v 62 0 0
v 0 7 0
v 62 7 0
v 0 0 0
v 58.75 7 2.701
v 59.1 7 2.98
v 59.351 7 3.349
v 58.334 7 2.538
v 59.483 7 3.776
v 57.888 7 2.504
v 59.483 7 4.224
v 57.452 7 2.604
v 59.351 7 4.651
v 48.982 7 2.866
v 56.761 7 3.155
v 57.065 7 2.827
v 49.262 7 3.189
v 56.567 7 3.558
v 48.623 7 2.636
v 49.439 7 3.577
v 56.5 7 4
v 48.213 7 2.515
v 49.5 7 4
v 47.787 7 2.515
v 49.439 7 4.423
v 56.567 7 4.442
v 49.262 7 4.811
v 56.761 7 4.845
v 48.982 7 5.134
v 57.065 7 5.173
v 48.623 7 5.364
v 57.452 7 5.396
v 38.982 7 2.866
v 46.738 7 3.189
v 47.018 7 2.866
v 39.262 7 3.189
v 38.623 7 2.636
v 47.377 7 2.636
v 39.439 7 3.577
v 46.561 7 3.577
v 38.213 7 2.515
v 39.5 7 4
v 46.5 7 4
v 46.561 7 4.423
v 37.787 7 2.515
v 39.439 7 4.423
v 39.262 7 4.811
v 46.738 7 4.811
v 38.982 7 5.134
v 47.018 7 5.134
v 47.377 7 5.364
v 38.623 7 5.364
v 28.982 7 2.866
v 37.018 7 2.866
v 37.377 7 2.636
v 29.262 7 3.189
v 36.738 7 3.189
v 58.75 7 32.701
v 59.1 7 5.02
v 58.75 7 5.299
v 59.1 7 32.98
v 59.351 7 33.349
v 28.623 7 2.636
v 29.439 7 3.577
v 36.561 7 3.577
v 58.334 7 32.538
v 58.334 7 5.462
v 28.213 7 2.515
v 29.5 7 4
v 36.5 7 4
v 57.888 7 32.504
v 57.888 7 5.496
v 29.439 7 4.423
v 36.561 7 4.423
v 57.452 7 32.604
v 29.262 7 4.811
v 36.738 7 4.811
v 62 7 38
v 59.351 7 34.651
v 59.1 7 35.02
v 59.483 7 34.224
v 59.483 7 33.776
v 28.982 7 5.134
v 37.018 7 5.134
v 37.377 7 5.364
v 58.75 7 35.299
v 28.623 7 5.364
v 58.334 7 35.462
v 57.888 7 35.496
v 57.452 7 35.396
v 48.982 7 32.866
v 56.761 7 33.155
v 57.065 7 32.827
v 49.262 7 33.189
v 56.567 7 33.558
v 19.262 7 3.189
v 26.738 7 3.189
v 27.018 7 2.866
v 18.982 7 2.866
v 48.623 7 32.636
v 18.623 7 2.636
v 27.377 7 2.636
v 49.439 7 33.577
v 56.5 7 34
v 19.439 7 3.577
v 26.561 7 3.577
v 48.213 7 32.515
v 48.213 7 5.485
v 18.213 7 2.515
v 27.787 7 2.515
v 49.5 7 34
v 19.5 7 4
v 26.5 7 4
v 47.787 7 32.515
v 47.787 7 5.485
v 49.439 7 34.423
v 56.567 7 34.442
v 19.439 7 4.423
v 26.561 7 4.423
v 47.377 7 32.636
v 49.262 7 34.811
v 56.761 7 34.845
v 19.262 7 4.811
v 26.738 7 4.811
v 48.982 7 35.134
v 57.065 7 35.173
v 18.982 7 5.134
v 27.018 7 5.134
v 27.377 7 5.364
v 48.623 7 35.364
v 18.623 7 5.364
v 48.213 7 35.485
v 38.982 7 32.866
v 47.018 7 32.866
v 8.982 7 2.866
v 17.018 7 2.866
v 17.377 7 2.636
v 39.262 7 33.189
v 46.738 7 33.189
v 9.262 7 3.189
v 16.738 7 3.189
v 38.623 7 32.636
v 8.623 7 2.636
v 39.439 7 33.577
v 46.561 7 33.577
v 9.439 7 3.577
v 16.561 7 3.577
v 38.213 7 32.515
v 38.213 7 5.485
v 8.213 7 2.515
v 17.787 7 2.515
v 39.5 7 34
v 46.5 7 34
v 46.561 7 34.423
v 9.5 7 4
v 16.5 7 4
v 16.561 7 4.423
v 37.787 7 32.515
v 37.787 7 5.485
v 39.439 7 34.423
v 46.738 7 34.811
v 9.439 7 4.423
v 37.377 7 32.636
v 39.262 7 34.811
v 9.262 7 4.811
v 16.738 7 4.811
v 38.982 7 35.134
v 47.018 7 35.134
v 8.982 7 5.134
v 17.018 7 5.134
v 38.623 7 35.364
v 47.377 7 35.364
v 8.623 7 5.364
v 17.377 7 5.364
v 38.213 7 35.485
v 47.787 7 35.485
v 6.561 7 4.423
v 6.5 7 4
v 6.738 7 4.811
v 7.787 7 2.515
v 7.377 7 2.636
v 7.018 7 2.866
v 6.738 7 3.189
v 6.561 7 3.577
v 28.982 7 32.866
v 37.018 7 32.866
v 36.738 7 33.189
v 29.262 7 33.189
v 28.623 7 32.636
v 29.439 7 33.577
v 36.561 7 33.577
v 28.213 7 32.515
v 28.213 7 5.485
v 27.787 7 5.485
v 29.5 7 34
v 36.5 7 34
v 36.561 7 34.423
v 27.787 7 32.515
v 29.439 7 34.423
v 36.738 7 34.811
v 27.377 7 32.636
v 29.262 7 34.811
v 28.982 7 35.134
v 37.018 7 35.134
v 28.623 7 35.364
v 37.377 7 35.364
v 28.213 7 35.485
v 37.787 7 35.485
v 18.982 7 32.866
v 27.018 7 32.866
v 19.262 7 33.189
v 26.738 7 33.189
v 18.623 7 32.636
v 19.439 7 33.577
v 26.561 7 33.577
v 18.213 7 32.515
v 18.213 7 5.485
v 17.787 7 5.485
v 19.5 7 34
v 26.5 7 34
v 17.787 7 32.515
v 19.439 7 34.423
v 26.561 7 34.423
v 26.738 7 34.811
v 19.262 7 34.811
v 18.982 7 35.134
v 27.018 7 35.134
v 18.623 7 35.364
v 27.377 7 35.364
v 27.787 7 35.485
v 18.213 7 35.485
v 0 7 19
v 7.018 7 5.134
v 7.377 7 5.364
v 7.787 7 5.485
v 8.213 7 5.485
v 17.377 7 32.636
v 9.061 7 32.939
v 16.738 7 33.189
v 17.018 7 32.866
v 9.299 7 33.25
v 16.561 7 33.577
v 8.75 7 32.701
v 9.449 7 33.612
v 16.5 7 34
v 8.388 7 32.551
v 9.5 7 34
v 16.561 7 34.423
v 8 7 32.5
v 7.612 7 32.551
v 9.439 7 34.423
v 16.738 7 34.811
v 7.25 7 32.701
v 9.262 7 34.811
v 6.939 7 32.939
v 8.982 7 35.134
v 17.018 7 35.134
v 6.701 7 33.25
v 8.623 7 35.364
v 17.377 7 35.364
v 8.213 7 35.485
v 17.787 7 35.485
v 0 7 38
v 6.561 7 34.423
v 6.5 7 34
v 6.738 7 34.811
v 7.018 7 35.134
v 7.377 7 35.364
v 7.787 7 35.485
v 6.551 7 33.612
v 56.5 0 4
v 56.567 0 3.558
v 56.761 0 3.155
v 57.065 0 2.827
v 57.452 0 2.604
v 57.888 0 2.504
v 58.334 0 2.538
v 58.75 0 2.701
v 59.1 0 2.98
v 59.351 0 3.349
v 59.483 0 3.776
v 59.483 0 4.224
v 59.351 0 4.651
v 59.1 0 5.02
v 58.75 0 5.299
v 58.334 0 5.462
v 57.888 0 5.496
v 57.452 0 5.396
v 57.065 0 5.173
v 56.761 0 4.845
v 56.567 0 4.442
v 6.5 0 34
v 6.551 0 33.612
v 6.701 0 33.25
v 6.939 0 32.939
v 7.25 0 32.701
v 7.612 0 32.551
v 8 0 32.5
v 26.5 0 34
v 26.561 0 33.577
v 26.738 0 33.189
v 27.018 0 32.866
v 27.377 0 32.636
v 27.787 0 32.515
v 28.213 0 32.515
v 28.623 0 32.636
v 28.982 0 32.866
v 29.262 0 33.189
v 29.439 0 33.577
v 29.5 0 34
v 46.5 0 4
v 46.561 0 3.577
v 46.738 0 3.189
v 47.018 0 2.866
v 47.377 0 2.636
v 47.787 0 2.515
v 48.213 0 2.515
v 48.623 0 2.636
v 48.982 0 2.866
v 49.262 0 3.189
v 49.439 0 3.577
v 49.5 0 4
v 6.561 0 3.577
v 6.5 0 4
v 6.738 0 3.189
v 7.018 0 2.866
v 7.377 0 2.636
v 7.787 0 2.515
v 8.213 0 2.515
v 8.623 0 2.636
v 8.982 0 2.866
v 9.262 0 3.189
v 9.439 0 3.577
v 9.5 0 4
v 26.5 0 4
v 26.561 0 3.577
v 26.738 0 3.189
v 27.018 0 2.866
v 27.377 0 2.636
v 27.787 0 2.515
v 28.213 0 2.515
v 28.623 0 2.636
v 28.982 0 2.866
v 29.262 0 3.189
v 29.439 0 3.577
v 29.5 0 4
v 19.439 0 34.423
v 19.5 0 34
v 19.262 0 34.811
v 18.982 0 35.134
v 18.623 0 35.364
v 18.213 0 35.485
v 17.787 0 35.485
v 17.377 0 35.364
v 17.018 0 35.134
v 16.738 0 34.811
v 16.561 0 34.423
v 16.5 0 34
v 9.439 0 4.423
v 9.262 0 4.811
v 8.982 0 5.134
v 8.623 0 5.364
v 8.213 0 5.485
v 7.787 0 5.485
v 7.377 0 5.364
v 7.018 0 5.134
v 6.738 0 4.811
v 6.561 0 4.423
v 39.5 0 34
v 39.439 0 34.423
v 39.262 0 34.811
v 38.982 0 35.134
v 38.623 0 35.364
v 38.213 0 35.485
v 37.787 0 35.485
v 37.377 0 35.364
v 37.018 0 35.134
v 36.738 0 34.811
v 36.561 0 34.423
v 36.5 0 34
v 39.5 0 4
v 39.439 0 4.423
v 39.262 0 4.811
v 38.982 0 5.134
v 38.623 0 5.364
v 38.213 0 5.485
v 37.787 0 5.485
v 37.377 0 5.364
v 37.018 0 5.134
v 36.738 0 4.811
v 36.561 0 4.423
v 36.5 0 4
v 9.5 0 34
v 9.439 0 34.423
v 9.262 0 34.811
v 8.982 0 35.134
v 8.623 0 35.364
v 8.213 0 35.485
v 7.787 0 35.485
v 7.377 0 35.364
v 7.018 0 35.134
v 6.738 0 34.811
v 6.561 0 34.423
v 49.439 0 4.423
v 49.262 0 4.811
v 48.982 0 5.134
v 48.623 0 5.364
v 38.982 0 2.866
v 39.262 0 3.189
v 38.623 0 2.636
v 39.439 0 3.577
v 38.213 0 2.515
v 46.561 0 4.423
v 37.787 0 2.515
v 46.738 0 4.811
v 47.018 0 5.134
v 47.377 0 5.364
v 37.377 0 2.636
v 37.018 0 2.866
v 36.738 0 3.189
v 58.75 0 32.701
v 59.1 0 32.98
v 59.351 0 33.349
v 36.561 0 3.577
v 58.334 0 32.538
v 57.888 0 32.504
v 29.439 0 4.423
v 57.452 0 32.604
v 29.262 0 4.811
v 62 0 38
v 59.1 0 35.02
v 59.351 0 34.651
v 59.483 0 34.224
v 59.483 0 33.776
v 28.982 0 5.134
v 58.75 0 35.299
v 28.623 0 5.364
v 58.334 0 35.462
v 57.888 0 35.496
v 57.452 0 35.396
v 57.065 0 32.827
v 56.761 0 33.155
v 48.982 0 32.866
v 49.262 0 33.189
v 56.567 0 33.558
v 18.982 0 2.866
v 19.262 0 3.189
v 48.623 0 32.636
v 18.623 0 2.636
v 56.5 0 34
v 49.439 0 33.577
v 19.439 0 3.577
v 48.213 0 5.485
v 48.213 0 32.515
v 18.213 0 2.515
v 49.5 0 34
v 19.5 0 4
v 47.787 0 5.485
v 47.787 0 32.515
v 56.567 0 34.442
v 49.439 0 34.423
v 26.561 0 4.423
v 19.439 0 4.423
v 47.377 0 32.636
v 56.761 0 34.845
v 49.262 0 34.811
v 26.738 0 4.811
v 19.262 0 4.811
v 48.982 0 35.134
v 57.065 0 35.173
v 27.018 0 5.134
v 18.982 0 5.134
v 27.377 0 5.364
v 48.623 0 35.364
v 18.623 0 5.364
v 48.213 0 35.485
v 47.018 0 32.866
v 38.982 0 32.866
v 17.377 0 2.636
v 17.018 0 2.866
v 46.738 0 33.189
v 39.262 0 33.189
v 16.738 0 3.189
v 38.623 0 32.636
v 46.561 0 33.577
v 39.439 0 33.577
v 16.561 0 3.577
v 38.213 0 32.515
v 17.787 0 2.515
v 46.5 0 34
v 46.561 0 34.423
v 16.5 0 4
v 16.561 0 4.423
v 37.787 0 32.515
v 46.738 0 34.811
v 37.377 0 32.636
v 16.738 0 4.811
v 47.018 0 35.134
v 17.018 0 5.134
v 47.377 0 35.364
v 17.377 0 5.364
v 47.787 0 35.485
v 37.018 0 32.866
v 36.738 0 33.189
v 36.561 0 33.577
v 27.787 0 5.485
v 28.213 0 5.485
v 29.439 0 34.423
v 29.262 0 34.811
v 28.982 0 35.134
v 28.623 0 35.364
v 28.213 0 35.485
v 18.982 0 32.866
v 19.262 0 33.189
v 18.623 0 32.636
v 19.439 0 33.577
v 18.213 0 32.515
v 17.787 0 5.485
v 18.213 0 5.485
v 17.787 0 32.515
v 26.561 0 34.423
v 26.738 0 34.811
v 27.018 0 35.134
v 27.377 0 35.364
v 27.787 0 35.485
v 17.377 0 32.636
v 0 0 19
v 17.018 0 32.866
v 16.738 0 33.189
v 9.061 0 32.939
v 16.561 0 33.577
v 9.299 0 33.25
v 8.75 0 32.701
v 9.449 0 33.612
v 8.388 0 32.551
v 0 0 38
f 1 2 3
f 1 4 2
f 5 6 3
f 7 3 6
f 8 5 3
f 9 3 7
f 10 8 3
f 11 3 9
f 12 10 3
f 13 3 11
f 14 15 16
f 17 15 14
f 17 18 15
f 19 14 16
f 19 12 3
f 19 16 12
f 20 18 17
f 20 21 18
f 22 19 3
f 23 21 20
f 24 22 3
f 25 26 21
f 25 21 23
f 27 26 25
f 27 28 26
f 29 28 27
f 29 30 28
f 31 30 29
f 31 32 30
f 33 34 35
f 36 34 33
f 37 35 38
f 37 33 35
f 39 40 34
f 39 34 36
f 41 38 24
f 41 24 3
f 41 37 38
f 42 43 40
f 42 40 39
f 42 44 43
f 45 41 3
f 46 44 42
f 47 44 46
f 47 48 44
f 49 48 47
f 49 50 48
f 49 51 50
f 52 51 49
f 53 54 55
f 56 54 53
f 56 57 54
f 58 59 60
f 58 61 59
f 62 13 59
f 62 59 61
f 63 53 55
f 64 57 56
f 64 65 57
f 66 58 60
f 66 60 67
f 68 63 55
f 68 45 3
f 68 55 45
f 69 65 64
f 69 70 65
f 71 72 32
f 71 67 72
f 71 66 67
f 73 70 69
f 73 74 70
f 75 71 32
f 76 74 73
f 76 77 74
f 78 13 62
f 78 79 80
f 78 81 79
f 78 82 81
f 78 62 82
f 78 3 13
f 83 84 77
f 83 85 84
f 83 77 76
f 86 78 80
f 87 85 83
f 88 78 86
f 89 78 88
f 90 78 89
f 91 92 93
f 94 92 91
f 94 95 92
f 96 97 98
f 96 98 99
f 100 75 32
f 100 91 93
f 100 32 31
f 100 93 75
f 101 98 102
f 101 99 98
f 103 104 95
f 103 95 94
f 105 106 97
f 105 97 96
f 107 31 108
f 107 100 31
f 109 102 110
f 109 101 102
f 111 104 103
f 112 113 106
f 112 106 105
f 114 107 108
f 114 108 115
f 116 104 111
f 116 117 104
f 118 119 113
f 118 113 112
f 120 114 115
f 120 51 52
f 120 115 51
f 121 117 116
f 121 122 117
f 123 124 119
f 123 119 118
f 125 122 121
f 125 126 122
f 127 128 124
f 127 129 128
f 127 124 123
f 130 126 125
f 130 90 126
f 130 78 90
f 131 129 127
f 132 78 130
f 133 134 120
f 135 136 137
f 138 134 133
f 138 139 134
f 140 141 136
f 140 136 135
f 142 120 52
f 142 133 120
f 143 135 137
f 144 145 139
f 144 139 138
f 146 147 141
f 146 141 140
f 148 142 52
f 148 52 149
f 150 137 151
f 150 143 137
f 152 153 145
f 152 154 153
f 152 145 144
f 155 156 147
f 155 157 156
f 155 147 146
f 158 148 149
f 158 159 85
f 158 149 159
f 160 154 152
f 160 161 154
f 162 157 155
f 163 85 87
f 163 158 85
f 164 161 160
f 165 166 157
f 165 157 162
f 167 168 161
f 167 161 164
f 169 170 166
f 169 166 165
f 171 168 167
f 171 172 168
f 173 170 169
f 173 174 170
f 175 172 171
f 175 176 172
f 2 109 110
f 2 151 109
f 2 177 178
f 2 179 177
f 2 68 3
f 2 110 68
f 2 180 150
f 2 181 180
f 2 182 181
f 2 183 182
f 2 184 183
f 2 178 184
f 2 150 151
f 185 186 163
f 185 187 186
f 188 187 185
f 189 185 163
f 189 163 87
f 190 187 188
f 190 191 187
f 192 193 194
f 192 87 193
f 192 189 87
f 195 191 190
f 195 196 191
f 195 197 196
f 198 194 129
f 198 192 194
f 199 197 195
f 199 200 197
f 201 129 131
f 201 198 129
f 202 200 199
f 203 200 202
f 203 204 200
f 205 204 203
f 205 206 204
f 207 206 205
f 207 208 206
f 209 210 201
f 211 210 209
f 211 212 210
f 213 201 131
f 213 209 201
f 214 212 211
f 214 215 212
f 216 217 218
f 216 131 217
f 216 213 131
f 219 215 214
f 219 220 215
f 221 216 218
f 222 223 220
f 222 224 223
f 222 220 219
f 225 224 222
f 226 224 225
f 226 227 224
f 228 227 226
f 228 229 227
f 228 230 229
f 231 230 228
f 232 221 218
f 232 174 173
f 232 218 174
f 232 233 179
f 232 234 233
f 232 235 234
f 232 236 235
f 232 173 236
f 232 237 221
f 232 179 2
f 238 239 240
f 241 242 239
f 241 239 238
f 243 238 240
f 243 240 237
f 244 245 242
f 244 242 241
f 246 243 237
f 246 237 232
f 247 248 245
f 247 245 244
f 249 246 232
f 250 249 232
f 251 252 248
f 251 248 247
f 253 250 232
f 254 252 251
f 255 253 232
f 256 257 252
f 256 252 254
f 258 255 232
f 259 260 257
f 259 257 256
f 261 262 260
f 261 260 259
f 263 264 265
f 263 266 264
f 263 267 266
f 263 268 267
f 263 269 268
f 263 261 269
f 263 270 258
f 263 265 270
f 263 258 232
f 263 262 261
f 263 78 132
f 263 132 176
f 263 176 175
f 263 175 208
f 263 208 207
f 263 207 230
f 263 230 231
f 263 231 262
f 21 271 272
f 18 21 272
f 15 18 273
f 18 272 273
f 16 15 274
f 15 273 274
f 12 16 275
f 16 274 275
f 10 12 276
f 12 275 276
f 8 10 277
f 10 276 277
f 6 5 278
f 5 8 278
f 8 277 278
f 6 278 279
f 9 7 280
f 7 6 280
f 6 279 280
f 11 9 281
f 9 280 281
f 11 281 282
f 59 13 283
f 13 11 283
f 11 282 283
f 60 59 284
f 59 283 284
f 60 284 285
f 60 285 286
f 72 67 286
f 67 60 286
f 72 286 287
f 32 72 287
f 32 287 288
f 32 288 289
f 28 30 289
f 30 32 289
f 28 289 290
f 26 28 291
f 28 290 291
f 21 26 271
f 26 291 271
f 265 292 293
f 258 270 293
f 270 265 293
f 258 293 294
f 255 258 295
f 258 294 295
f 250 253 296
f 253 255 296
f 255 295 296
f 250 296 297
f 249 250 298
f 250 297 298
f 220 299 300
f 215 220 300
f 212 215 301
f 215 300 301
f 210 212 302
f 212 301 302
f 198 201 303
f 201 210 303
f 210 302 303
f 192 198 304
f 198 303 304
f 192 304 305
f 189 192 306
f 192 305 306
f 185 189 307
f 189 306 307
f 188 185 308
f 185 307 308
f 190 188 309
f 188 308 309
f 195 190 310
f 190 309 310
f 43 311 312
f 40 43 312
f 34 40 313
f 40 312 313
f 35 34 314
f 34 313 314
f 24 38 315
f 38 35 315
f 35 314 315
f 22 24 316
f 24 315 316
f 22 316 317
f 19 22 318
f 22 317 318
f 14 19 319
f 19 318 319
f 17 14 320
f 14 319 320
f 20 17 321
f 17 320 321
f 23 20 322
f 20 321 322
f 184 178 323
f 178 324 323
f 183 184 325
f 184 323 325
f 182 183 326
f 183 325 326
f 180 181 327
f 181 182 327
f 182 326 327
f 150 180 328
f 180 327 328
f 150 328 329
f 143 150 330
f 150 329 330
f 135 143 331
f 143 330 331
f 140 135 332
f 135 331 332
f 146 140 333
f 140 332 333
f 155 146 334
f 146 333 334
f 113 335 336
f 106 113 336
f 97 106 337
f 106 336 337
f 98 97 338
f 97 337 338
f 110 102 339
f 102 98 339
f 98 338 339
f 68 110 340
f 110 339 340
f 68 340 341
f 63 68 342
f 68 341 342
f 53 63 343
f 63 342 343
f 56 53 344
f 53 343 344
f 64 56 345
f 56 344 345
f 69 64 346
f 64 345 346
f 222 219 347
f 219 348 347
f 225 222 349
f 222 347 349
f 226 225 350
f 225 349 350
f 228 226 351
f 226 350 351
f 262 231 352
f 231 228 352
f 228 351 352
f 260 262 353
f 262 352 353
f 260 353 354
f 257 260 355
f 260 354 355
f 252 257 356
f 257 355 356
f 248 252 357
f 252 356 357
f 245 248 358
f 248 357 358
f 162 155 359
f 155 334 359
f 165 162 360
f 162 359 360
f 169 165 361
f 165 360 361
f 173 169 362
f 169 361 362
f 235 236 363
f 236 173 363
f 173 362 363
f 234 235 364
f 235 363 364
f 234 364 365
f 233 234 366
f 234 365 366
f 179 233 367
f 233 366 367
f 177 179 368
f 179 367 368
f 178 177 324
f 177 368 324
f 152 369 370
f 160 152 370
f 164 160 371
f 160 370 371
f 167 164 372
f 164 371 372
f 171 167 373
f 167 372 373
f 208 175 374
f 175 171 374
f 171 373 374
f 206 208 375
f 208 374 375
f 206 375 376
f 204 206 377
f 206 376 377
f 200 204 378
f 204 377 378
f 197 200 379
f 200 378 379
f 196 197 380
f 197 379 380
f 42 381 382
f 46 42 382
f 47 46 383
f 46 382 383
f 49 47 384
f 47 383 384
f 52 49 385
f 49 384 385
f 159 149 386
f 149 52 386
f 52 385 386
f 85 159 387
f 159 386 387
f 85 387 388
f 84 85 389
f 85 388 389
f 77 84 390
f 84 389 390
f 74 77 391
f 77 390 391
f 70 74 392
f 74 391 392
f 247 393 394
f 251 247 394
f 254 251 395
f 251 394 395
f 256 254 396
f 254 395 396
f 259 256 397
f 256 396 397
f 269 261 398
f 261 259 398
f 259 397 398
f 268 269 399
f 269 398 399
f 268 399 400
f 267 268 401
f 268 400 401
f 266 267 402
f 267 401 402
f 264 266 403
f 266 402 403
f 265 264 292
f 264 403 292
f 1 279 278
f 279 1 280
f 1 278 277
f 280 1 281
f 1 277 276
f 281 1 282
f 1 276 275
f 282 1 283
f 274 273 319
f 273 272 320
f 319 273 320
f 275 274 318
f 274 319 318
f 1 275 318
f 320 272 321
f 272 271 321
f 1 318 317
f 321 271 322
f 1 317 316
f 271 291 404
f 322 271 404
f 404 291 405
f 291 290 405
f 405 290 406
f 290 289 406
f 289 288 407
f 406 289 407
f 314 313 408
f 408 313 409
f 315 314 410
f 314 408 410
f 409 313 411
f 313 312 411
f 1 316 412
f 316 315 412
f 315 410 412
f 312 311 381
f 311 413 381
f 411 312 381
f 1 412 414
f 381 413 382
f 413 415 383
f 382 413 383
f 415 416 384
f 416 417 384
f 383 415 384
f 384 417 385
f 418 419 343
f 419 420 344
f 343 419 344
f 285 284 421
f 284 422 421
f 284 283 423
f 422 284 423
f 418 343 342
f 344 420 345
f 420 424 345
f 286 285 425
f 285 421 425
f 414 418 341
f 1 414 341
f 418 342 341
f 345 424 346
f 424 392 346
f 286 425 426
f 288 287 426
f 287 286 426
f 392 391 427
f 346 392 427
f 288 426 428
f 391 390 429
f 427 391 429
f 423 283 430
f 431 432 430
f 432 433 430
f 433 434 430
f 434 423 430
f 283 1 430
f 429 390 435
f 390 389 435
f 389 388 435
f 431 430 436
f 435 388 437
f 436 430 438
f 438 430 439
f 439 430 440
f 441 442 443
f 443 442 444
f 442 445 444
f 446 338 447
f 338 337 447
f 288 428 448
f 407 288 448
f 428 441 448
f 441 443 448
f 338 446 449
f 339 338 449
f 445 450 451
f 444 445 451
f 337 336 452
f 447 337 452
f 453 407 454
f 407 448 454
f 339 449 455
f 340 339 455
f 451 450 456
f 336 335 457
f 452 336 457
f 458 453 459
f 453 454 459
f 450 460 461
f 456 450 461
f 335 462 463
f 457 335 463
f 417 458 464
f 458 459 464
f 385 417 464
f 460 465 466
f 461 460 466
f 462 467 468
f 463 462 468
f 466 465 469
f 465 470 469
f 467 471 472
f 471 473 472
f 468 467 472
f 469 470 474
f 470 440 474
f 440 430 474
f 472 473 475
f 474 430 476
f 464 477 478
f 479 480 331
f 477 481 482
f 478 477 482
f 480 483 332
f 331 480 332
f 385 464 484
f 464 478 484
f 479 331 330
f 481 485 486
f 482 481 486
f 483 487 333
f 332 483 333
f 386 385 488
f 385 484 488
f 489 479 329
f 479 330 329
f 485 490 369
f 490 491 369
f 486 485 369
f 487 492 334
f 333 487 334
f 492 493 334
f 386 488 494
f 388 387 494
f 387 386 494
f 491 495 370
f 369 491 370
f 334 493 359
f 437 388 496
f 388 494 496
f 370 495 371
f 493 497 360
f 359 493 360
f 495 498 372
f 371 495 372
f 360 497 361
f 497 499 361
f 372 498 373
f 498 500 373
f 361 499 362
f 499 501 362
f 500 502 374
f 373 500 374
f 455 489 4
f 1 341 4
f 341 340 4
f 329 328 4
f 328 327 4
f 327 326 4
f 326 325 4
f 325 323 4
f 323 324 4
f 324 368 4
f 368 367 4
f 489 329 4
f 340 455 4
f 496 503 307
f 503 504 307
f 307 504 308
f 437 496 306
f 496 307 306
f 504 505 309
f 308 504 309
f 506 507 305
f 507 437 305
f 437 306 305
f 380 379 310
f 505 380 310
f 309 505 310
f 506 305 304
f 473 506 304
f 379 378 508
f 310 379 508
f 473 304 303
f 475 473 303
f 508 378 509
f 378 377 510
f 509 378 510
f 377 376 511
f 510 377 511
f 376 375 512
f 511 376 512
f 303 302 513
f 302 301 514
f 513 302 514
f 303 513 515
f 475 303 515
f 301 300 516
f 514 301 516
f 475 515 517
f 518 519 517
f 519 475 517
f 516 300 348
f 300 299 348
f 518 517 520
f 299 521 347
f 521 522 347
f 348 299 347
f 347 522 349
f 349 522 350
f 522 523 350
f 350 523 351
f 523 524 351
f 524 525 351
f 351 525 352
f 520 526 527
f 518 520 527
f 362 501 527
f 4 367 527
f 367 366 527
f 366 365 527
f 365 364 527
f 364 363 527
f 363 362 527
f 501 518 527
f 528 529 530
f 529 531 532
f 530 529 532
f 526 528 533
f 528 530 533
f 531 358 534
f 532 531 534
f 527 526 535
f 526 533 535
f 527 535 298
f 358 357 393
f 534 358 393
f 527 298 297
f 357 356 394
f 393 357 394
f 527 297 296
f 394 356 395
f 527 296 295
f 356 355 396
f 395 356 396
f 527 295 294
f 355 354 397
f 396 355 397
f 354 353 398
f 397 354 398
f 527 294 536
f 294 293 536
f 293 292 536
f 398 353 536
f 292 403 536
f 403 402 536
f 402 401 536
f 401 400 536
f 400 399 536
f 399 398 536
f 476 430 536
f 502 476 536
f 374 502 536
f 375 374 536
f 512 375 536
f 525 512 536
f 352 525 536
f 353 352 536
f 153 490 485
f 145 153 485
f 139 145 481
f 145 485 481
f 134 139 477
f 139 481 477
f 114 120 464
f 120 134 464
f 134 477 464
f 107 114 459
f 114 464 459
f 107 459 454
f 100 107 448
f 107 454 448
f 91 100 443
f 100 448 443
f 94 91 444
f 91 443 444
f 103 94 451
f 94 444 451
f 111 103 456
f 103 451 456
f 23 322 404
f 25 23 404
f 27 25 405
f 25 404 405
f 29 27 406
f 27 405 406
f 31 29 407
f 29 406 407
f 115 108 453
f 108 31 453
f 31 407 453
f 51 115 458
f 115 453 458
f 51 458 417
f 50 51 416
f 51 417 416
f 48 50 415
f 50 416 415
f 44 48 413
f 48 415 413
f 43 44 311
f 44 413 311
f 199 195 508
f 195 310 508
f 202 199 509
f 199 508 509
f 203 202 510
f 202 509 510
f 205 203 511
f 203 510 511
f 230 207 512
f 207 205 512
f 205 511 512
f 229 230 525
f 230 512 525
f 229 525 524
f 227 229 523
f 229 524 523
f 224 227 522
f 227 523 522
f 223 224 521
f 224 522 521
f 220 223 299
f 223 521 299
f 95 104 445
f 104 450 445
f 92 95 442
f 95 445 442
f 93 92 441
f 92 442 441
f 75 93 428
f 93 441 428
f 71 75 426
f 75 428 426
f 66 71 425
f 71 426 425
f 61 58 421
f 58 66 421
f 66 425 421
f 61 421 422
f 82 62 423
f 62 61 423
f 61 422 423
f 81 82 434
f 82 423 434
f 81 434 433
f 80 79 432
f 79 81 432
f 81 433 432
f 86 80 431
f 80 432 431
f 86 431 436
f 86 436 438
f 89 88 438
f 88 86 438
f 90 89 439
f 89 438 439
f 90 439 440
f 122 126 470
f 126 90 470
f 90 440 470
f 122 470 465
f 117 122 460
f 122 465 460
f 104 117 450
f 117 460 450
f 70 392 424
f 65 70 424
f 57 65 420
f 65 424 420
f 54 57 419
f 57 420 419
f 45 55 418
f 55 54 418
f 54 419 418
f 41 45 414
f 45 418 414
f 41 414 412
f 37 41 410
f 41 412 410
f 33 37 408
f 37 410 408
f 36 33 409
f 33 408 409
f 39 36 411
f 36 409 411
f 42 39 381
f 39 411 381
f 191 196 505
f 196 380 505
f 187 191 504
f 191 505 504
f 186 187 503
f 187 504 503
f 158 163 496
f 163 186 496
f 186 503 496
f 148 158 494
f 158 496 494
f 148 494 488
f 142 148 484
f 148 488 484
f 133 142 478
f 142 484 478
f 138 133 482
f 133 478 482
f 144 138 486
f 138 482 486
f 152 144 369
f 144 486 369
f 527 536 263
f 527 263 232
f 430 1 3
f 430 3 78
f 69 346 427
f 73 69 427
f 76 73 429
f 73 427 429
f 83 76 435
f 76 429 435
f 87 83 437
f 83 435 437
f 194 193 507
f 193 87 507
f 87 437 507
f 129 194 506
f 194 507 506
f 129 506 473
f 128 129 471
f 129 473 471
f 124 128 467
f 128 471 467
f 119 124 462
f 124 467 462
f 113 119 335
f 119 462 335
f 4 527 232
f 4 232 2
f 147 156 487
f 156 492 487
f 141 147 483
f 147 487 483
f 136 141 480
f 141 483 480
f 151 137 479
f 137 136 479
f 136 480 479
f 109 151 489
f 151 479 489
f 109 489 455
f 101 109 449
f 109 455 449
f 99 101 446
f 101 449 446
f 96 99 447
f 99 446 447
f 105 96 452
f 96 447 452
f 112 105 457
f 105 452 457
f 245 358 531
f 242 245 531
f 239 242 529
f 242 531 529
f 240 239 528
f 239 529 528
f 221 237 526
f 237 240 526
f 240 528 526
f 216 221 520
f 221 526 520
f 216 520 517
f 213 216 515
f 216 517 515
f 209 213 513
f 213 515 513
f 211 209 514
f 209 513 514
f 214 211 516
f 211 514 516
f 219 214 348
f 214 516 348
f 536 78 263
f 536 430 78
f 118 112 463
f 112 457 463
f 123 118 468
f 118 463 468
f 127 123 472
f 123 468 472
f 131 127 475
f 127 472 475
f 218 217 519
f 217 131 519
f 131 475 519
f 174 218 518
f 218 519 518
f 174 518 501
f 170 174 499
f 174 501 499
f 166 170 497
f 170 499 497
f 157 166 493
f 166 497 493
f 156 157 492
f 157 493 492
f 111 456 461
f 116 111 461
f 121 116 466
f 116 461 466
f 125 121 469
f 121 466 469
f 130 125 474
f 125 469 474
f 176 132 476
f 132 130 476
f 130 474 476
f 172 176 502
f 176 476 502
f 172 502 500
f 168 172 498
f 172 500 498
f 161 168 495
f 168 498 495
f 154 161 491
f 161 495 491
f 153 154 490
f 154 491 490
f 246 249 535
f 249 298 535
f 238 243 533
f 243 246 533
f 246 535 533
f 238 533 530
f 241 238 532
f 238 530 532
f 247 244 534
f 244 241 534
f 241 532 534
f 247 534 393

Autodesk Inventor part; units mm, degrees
ref_plane "YZ Plane" through (0, 0, 0) normal (1, 0, 0) x (0, 1, 0)
ref_plane "XZ Plane" through (0, 0, 0) normal (0, 1, 0) x (-1, 0, 0)
ref_plane "XY Plane" through (0, 0, 0) normal (0, 0, 1) x (1, 0, 0)
sketch "スケッチ1" plane through (0, 0, 0) normal (0, 1, 0) x (-1, 0, 0)
  line L0 (0, 0) -> (-62, 0)
  line L1 (-62, 0) -> (-62, 38)
  line L2 (-62, 38) -> (0, 38)
  line L3 (0, 38) -> (0, 0)
  line L4 (0, 19) -> (-8, 19)
  line L5 (-8, 19) -> (-8, 34)
  line L6 (-8, 34) -> (-18, 34)
  line L7 (-18, 34) -> (-28, 34)
  line L8 (-28, 34) -> (-38, 34)
  line L9 (-38, 34) -> (-48, 34)
  line L10 (-48, 34) -> (-58, 34)
  line L11 (-8, 4) -> (-18, 4)
  line L12 (-18, 4) -> (-28, 4)
  line L13 (-28, 4) -> (-38, 4)
  line L14 (-38, 4) -> (-48, 4)
  line L15 (-48, 4) -> (-58, 4)
  circle A0 centre (-58, 34) radius 1.5
  circle A1 centre (-48, 34) radius 1.5
  circle A2 centre (-38, 34) radius 1.5
  circle A3 centre (-28, 34) radius 1.5
  circle A4 centre (-18, 34) radius 1.5
  circle A5 centre (-8, 34) radius 1.5
  circle A6 centre (-58, 4) radius 1.5
  circle A7 centre (-48, 4) radius 1.5
  circle A8 centre (-38, 4) radius 1.5
  circle A9 centre (-28, 4) radius 1.5
  circle A10 centre (-18, 4) radius 1.5
  circle A11 centre (-8, 4) radius 1.5
  dimension "d0" = 62
  dimension "d1" = 38
  dimension "d2" = 8
  dimension "d3" = 15
  dimension "d4" = 10
  dimension "d5" = 10
  dimension "d6" = 10
  dimension "d7" = 10
  dimension "d8" = 10
  dimension "d9" = 3
  dimension "d10" = 3
  dimension "d11" = 3
  dimension "d12" = 3
  dimension "d13" = 3
  dimension "d14" = 3
extrude "押し出し1" add sketch "スケッチ1" along normal blind 7
properties part number "知能ロボコンギアボックススペーサ" material "ABS プラスチック"
